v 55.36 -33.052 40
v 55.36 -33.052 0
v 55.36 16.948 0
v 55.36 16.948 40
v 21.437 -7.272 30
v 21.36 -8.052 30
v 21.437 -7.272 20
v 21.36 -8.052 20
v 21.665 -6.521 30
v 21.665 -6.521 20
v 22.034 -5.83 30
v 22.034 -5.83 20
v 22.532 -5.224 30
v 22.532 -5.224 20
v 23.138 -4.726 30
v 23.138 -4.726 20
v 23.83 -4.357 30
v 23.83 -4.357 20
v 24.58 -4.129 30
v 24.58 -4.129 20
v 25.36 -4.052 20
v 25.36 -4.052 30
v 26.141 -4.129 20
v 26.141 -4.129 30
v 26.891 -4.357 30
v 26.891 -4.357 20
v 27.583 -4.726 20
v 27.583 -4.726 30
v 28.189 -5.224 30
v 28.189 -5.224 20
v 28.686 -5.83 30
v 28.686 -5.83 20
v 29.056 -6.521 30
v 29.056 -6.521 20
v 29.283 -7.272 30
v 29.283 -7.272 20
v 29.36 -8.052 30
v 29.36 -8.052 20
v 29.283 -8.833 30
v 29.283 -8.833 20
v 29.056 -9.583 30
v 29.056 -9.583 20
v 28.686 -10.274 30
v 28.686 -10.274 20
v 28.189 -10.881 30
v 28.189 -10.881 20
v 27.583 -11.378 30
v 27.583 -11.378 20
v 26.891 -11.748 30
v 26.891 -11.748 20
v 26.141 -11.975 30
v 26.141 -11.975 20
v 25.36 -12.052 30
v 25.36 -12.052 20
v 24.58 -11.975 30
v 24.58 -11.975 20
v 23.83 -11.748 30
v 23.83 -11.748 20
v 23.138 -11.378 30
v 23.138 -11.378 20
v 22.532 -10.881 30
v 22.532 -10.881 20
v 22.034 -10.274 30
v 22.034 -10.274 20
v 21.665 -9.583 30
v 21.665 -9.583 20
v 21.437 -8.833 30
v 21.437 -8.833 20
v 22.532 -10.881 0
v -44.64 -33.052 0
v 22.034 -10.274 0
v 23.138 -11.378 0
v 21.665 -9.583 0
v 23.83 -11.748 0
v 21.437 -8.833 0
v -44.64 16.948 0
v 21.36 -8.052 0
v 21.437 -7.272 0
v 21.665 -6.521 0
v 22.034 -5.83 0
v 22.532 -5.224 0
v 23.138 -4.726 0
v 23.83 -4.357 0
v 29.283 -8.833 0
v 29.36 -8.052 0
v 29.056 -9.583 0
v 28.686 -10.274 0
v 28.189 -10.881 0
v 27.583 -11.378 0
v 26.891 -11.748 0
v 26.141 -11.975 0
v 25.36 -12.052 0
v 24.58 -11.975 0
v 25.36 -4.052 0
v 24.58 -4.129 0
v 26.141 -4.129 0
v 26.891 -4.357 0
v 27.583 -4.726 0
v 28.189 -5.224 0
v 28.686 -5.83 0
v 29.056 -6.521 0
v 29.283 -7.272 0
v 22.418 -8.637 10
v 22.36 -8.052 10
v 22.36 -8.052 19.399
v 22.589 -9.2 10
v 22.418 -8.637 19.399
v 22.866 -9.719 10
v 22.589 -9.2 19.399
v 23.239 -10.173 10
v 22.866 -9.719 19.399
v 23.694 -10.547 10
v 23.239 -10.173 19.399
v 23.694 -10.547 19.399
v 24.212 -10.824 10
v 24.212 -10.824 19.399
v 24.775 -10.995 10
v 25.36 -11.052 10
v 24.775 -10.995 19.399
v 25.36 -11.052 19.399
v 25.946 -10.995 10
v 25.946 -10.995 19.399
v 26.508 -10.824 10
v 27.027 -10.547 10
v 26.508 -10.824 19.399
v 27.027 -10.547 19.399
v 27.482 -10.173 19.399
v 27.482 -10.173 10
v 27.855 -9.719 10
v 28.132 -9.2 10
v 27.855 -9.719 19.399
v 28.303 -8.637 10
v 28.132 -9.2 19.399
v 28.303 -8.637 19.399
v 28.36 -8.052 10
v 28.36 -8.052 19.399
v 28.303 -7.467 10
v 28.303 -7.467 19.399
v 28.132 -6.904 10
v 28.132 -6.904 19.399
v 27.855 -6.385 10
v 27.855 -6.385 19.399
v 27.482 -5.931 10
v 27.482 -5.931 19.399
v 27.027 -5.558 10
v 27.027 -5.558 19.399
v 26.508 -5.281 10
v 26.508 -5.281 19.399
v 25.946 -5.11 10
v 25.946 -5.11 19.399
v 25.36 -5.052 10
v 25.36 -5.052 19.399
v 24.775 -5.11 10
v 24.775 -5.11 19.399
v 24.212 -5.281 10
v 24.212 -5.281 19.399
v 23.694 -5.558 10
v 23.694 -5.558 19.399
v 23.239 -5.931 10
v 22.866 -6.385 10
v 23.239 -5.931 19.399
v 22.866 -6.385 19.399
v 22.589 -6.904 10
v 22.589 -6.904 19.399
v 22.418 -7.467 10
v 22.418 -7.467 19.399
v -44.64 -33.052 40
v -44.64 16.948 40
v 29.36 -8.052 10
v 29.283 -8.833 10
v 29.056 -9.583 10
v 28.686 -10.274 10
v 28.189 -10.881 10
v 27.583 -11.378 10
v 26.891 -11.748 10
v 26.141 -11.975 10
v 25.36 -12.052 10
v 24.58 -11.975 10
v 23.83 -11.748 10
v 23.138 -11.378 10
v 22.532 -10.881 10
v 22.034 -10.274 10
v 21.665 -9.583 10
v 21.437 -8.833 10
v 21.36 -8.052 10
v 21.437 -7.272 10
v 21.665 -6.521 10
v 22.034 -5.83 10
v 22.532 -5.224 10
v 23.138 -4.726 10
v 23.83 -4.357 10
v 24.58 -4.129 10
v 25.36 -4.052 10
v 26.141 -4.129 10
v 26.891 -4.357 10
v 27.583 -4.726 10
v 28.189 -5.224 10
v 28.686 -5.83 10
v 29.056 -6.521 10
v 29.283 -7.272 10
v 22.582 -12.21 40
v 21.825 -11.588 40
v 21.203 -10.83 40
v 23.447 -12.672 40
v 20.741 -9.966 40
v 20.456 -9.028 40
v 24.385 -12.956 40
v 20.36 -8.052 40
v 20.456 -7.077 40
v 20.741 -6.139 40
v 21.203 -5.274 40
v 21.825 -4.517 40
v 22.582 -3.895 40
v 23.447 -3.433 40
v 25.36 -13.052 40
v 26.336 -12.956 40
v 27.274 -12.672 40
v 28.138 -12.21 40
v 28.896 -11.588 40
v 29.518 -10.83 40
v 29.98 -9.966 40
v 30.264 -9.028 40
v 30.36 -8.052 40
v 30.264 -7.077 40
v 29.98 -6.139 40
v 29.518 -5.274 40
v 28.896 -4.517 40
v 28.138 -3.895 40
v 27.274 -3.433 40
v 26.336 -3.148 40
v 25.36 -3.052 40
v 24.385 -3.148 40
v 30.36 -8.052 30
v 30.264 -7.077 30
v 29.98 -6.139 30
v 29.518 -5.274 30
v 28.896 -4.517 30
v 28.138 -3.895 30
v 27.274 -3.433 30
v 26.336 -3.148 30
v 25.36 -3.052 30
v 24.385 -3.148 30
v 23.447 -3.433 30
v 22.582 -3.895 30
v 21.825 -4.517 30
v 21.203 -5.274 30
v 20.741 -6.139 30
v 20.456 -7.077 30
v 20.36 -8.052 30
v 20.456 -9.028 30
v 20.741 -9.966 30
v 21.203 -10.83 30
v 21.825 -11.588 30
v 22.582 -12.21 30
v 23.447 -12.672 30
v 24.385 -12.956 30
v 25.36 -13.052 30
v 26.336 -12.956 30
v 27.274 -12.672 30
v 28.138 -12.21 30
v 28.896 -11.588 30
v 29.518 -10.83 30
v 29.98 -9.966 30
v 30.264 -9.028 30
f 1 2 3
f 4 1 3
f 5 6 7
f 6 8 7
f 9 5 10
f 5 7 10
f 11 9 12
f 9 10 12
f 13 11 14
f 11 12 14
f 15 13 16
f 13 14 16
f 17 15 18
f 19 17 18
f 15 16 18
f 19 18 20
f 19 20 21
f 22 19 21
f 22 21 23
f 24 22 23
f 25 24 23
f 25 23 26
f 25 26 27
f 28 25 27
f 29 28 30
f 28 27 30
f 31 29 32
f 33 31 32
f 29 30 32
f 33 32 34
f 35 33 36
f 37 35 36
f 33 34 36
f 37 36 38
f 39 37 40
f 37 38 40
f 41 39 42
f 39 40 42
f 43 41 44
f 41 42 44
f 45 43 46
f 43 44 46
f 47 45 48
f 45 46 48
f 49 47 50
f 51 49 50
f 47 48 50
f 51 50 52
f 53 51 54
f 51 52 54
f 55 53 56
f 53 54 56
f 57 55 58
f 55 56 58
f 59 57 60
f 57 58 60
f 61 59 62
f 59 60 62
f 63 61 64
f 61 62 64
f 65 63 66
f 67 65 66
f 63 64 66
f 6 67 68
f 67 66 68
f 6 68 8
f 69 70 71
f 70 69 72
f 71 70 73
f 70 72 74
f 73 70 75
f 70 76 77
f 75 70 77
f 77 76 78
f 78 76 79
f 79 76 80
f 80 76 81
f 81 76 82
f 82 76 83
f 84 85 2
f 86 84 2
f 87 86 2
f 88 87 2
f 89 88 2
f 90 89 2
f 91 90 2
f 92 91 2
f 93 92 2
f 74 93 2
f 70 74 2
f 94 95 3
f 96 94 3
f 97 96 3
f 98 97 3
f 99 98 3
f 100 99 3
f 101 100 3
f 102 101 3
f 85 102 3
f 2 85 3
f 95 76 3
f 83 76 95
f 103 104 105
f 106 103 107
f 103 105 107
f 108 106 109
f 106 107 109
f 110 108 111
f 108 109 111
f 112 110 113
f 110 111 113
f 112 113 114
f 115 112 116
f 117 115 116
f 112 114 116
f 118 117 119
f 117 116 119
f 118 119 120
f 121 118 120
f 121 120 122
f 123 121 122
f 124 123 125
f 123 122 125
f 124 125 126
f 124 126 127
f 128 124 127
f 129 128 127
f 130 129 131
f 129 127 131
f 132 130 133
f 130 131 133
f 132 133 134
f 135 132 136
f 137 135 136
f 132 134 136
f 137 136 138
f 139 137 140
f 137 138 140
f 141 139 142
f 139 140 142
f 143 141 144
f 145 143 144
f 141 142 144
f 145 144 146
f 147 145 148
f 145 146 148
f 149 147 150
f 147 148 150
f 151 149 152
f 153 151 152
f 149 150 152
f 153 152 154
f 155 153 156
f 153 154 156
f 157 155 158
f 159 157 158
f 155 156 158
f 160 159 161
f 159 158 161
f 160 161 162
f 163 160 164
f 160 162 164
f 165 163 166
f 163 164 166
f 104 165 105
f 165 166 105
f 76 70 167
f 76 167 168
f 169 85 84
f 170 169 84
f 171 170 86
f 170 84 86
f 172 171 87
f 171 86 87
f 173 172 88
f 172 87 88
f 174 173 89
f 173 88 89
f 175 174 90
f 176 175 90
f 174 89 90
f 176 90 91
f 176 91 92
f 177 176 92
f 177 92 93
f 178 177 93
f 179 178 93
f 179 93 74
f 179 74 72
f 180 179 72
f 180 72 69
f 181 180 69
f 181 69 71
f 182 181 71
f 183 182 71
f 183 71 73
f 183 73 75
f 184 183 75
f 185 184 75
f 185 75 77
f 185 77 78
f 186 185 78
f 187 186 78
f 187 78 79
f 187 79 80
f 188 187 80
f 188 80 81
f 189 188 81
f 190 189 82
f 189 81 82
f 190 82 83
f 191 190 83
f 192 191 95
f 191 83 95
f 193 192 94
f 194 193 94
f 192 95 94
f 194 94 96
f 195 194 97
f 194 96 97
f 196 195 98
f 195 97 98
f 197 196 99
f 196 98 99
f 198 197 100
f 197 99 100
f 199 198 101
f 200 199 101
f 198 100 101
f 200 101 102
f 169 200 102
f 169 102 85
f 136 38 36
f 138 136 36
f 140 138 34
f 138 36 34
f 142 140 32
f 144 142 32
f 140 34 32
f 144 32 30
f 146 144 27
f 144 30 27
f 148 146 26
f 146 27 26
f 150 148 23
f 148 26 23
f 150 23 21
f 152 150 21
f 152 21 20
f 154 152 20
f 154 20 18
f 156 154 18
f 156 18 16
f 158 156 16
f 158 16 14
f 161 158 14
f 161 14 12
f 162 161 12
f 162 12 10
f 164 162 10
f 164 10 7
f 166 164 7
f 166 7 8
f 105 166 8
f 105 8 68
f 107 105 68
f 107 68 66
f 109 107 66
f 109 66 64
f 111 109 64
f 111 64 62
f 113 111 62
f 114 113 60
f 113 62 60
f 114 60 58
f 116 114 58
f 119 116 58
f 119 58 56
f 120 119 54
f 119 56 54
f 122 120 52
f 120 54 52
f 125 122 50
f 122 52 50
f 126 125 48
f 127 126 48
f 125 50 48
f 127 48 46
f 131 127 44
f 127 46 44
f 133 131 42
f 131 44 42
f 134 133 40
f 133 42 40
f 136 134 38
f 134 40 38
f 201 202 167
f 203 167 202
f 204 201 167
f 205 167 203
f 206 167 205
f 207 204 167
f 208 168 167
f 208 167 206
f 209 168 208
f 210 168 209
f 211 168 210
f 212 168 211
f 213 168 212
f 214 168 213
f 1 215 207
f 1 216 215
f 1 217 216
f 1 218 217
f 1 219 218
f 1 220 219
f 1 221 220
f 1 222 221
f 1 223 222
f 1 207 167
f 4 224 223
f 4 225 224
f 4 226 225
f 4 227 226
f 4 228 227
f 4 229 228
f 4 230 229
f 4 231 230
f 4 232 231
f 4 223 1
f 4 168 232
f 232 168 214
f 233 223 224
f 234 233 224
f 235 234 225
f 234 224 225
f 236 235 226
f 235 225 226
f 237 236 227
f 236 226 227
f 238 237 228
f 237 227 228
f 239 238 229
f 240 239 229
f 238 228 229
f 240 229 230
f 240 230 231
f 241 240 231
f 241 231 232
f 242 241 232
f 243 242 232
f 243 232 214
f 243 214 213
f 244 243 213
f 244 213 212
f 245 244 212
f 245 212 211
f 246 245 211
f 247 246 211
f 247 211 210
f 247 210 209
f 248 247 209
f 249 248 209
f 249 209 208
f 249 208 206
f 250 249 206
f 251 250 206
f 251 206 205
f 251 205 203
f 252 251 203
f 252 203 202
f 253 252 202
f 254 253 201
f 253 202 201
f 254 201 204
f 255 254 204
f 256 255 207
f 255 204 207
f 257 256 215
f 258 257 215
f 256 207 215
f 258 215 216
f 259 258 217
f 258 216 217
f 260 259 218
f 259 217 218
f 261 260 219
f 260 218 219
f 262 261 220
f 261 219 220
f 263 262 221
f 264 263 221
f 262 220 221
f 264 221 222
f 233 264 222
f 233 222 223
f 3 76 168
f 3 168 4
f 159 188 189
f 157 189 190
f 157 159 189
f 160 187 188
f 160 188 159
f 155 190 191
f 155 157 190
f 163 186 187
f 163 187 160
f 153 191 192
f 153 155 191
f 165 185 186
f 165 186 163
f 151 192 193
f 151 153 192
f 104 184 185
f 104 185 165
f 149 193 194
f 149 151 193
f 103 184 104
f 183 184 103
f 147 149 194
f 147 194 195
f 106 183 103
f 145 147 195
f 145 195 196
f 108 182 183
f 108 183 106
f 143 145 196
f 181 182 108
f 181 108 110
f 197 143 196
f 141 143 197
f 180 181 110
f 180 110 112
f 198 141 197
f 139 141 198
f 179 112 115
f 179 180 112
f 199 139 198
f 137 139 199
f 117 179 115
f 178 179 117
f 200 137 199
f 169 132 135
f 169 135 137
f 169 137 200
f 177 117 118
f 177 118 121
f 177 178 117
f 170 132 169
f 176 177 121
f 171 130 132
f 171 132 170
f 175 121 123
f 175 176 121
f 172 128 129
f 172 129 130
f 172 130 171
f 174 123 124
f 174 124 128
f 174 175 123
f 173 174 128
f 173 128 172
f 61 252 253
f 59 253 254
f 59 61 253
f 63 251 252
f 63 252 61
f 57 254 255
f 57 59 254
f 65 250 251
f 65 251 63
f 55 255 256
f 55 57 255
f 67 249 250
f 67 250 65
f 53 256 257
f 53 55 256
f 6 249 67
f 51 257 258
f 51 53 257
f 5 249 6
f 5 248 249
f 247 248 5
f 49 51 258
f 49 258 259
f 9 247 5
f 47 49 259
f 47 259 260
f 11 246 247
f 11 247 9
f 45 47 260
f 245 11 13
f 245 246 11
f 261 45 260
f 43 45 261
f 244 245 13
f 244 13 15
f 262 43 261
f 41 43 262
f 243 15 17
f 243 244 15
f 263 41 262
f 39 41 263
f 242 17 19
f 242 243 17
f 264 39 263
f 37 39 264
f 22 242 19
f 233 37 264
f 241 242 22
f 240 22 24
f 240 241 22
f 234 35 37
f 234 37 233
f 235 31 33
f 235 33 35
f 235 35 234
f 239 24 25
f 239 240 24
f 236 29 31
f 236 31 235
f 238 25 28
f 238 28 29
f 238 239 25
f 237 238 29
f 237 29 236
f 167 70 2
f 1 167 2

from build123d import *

# Parameters (mm, degrees)
F0_W           = 100
F0_H           = 50
F1_DEPTH       = 40
F3_D           = 8
F3_DEPTH       = 20
F3_CBORE_D     = 10
F3_CBORE_DEPTH = 10
F3_TIP         = 2.4034424761
F5_D           = 6
F5_DEPTH       = 20
F5_CBORE_D     = 8
F5_CBORE_DEPTH = 10
F5_TIP         = 1.8025818571


with BuildPart() as f1:
    # F0 (on Top) → F1 (new body)
    with BuildSketch(Plane.XY):
        with Locations((5.3602904081, -8.052177819)):
            Rectangle(F0_W, F0_H)
    extrude(amount=F1_DEPTH)

    # F3
    with Locations(Plane.XY.offset(40)):
        with Locations((25.3602904081, -8.052177819)):
            CounterBoreHole(F3_D / 2, F3_CBORE_D / 2, F3_CBORE_DEPTH, depth=F3_DEPTH)
            with Locations((0, 0, -(F3_DEPTH + F3_TIP / 2))):  # 118° drill point
                Cone(0, F3_D / 2, F3_TIP, mode=Mode.SUBTRACT)

    # F5
    with Locations(Plane(origin=(0, 0, 0), x_dir=(1, 0, 0), z_dir=(0, 0, -1))):
        with Locations((25.3602904081, 8.052177819)):
            CounterBoreHole(F5_D / 2, F5_CBORE_D / 2, F5_CBORE_DEPTH, depth=F5_DEPTH)
            with Locations((0, 0, -(F5_DEPTH + F5_TIP / 2))):  # 118° drill point
                Cone(0, F5_D / 2, F5_TIP, mode=Mode.SUBTRACT)


solid = f1.part
